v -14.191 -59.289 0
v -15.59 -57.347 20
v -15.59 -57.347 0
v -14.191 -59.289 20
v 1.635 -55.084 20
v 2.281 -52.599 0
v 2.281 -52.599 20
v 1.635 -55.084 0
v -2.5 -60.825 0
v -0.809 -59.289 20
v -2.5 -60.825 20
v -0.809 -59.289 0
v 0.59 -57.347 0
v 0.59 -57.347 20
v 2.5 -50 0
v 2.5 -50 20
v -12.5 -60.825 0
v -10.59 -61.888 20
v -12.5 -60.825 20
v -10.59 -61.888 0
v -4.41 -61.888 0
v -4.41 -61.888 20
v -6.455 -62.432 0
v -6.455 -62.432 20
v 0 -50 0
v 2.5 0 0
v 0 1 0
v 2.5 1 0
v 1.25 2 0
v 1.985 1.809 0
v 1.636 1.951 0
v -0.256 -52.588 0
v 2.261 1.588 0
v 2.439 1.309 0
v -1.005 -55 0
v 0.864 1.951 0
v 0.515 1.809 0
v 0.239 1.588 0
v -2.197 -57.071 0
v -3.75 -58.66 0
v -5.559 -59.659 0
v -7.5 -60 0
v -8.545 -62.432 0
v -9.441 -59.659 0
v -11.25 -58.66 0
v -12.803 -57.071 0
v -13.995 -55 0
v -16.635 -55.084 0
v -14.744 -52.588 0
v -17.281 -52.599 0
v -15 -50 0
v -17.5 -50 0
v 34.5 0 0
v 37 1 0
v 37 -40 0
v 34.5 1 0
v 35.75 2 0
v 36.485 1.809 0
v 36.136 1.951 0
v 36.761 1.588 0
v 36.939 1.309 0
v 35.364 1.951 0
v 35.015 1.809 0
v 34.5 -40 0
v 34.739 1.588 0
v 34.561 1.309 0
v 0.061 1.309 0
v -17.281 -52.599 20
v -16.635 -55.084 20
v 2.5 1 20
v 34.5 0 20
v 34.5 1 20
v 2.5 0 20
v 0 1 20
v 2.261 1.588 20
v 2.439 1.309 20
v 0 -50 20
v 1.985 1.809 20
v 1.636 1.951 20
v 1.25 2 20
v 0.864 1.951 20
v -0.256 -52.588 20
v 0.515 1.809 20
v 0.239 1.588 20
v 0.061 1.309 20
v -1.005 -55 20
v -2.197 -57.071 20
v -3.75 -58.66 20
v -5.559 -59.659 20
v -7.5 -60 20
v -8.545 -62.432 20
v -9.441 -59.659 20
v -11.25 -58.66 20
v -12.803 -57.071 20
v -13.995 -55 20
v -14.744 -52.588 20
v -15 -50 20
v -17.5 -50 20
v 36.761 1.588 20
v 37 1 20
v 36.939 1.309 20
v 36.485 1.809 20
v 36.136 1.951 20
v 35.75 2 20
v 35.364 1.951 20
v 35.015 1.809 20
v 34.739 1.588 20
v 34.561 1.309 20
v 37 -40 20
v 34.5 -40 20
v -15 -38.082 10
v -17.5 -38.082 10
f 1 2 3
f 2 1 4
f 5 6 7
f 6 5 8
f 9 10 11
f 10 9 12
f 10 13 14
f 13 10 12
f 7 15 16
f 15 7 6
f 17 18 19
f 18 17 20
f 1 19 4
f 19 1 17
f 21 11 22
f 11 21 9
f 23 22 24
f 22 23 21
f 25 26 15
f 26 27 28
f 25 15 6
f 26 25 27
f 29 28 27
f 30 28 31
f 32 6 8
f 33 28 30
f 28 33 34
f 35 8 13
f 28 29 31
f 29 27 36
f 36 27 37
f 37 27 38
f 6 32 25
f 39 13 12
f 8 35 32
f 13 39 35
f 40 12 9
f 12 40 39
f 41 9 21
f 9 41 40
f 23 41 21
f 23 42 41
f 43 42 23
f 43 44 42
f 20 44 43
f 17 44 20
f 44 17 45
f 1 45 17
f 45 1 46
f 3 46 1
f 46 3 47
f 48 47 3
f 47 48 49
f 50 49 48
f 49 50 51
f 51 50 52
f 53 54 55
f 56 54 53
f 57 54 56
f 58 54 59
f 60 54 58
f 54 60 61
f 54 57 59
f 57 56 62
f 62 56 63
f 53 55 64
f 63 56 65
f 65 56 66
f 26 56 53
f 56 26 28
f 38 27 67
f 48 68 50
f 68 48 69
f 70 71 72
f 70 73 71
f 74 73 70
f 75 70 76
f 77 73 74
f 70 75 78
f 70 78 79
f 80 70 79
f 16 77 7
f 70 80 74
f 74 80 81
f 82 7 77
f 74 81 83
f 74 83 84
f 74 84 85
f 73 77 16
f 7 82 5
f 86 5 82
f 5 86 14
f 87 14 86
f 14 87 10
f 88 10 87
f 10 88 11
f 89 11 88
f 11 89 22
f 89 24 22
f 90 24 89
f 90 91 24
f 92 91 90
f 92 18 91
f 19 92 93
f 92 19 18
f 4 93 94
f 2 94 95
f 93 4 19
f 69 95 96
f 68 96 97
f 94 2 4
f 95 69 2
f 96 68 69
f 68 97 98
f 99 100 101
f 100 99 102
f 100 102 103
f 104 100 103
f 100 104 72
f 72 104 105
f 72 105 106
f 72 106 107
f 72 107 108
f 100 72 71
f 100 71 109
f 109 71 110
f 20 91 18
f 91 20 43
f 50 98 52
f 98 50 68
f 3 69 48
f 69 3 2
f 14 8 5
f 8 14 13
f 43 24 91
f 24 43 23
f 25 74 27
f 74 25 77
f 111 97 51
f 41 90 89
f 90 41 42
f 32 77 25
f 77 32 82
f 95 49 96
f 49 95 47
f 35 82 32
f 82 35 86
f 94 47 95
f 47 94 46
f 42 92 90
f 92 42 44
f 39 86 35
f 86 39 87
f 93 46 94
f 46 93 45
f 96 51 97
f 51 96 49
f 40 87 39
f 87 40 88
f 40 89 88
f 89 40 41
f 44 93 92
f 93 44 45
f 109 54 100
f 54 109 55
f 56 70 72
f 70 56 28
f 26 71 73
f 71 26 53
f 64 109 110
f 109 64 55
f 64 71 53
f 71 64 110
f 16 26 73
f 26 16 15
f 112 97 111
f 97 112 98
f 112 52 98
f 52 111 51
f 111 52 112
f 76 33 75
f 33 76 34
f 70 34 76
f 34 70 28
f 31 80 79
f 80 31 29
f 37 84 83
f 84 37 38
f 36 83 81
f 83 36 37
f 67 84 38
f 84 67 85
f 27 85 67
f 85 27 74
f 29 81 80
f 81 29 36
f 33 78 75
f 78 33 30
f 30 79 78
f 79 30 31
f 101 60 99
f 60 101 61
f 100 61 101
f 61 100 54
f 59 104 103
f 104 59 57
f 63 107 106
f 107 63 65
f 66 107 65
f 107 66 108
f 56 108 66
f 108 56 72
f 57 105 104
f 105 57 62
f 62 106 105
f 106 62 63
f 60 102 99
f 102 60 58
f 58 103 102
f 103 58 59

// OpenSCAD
a = 32; 
b = 40; 
height = 20; 
a_thickness = 1;
b_thickness = 2.5;
bump = 2;
c = 50;
d = 20;
e = 15;


cube ([a+2*b_thickness, a_thickness, height]);

translate([a+b_thickness,0,0])
rotate (-90)
cube ([b, b_thickness, height]);

rotate (-90)
cube ([c, b_thickness, height]);

difference(){
translate ([-e/2,-c+0.000001,0])
scale ([1, (d+2*b_thickness)/(e+2*b_thickness),1])
difference(){
    cylinder (d=e+2*b_thickness, h = height);
    rotate(90)
    translate([0,0,-0.1*height])
    cube([d+3*b_thickness, d+3*b_thickness, 3*height]);
}

translate ([-e/2,-c + d/2,0])
cube ([e, d, 3*height], center = true);



translate ([-e/2,-c,0])
scale ([1, d/e,1])
cylinder (d=e, h = 3*height, center = true);
}


angle = 40;

translate([-e,-c,0])
rotate([0,-90,0])
linear_extrude(height = b_thickness){
polygon([[0,0],[height,0],[height/2,1/tan(angle)*height/2]]);
}


translate([b_thickness/2,a_thickness,0])
scale([1,bump/b_thickness,1])
cylinder (d = b_thickness, h = height, $fn = 20);


translate([b_thickness*1.5+a,a_thickness,0])
scale([1,bump/b_thickness,1])
cylinder (d = b_thickness, h = height, $fn = 20);
